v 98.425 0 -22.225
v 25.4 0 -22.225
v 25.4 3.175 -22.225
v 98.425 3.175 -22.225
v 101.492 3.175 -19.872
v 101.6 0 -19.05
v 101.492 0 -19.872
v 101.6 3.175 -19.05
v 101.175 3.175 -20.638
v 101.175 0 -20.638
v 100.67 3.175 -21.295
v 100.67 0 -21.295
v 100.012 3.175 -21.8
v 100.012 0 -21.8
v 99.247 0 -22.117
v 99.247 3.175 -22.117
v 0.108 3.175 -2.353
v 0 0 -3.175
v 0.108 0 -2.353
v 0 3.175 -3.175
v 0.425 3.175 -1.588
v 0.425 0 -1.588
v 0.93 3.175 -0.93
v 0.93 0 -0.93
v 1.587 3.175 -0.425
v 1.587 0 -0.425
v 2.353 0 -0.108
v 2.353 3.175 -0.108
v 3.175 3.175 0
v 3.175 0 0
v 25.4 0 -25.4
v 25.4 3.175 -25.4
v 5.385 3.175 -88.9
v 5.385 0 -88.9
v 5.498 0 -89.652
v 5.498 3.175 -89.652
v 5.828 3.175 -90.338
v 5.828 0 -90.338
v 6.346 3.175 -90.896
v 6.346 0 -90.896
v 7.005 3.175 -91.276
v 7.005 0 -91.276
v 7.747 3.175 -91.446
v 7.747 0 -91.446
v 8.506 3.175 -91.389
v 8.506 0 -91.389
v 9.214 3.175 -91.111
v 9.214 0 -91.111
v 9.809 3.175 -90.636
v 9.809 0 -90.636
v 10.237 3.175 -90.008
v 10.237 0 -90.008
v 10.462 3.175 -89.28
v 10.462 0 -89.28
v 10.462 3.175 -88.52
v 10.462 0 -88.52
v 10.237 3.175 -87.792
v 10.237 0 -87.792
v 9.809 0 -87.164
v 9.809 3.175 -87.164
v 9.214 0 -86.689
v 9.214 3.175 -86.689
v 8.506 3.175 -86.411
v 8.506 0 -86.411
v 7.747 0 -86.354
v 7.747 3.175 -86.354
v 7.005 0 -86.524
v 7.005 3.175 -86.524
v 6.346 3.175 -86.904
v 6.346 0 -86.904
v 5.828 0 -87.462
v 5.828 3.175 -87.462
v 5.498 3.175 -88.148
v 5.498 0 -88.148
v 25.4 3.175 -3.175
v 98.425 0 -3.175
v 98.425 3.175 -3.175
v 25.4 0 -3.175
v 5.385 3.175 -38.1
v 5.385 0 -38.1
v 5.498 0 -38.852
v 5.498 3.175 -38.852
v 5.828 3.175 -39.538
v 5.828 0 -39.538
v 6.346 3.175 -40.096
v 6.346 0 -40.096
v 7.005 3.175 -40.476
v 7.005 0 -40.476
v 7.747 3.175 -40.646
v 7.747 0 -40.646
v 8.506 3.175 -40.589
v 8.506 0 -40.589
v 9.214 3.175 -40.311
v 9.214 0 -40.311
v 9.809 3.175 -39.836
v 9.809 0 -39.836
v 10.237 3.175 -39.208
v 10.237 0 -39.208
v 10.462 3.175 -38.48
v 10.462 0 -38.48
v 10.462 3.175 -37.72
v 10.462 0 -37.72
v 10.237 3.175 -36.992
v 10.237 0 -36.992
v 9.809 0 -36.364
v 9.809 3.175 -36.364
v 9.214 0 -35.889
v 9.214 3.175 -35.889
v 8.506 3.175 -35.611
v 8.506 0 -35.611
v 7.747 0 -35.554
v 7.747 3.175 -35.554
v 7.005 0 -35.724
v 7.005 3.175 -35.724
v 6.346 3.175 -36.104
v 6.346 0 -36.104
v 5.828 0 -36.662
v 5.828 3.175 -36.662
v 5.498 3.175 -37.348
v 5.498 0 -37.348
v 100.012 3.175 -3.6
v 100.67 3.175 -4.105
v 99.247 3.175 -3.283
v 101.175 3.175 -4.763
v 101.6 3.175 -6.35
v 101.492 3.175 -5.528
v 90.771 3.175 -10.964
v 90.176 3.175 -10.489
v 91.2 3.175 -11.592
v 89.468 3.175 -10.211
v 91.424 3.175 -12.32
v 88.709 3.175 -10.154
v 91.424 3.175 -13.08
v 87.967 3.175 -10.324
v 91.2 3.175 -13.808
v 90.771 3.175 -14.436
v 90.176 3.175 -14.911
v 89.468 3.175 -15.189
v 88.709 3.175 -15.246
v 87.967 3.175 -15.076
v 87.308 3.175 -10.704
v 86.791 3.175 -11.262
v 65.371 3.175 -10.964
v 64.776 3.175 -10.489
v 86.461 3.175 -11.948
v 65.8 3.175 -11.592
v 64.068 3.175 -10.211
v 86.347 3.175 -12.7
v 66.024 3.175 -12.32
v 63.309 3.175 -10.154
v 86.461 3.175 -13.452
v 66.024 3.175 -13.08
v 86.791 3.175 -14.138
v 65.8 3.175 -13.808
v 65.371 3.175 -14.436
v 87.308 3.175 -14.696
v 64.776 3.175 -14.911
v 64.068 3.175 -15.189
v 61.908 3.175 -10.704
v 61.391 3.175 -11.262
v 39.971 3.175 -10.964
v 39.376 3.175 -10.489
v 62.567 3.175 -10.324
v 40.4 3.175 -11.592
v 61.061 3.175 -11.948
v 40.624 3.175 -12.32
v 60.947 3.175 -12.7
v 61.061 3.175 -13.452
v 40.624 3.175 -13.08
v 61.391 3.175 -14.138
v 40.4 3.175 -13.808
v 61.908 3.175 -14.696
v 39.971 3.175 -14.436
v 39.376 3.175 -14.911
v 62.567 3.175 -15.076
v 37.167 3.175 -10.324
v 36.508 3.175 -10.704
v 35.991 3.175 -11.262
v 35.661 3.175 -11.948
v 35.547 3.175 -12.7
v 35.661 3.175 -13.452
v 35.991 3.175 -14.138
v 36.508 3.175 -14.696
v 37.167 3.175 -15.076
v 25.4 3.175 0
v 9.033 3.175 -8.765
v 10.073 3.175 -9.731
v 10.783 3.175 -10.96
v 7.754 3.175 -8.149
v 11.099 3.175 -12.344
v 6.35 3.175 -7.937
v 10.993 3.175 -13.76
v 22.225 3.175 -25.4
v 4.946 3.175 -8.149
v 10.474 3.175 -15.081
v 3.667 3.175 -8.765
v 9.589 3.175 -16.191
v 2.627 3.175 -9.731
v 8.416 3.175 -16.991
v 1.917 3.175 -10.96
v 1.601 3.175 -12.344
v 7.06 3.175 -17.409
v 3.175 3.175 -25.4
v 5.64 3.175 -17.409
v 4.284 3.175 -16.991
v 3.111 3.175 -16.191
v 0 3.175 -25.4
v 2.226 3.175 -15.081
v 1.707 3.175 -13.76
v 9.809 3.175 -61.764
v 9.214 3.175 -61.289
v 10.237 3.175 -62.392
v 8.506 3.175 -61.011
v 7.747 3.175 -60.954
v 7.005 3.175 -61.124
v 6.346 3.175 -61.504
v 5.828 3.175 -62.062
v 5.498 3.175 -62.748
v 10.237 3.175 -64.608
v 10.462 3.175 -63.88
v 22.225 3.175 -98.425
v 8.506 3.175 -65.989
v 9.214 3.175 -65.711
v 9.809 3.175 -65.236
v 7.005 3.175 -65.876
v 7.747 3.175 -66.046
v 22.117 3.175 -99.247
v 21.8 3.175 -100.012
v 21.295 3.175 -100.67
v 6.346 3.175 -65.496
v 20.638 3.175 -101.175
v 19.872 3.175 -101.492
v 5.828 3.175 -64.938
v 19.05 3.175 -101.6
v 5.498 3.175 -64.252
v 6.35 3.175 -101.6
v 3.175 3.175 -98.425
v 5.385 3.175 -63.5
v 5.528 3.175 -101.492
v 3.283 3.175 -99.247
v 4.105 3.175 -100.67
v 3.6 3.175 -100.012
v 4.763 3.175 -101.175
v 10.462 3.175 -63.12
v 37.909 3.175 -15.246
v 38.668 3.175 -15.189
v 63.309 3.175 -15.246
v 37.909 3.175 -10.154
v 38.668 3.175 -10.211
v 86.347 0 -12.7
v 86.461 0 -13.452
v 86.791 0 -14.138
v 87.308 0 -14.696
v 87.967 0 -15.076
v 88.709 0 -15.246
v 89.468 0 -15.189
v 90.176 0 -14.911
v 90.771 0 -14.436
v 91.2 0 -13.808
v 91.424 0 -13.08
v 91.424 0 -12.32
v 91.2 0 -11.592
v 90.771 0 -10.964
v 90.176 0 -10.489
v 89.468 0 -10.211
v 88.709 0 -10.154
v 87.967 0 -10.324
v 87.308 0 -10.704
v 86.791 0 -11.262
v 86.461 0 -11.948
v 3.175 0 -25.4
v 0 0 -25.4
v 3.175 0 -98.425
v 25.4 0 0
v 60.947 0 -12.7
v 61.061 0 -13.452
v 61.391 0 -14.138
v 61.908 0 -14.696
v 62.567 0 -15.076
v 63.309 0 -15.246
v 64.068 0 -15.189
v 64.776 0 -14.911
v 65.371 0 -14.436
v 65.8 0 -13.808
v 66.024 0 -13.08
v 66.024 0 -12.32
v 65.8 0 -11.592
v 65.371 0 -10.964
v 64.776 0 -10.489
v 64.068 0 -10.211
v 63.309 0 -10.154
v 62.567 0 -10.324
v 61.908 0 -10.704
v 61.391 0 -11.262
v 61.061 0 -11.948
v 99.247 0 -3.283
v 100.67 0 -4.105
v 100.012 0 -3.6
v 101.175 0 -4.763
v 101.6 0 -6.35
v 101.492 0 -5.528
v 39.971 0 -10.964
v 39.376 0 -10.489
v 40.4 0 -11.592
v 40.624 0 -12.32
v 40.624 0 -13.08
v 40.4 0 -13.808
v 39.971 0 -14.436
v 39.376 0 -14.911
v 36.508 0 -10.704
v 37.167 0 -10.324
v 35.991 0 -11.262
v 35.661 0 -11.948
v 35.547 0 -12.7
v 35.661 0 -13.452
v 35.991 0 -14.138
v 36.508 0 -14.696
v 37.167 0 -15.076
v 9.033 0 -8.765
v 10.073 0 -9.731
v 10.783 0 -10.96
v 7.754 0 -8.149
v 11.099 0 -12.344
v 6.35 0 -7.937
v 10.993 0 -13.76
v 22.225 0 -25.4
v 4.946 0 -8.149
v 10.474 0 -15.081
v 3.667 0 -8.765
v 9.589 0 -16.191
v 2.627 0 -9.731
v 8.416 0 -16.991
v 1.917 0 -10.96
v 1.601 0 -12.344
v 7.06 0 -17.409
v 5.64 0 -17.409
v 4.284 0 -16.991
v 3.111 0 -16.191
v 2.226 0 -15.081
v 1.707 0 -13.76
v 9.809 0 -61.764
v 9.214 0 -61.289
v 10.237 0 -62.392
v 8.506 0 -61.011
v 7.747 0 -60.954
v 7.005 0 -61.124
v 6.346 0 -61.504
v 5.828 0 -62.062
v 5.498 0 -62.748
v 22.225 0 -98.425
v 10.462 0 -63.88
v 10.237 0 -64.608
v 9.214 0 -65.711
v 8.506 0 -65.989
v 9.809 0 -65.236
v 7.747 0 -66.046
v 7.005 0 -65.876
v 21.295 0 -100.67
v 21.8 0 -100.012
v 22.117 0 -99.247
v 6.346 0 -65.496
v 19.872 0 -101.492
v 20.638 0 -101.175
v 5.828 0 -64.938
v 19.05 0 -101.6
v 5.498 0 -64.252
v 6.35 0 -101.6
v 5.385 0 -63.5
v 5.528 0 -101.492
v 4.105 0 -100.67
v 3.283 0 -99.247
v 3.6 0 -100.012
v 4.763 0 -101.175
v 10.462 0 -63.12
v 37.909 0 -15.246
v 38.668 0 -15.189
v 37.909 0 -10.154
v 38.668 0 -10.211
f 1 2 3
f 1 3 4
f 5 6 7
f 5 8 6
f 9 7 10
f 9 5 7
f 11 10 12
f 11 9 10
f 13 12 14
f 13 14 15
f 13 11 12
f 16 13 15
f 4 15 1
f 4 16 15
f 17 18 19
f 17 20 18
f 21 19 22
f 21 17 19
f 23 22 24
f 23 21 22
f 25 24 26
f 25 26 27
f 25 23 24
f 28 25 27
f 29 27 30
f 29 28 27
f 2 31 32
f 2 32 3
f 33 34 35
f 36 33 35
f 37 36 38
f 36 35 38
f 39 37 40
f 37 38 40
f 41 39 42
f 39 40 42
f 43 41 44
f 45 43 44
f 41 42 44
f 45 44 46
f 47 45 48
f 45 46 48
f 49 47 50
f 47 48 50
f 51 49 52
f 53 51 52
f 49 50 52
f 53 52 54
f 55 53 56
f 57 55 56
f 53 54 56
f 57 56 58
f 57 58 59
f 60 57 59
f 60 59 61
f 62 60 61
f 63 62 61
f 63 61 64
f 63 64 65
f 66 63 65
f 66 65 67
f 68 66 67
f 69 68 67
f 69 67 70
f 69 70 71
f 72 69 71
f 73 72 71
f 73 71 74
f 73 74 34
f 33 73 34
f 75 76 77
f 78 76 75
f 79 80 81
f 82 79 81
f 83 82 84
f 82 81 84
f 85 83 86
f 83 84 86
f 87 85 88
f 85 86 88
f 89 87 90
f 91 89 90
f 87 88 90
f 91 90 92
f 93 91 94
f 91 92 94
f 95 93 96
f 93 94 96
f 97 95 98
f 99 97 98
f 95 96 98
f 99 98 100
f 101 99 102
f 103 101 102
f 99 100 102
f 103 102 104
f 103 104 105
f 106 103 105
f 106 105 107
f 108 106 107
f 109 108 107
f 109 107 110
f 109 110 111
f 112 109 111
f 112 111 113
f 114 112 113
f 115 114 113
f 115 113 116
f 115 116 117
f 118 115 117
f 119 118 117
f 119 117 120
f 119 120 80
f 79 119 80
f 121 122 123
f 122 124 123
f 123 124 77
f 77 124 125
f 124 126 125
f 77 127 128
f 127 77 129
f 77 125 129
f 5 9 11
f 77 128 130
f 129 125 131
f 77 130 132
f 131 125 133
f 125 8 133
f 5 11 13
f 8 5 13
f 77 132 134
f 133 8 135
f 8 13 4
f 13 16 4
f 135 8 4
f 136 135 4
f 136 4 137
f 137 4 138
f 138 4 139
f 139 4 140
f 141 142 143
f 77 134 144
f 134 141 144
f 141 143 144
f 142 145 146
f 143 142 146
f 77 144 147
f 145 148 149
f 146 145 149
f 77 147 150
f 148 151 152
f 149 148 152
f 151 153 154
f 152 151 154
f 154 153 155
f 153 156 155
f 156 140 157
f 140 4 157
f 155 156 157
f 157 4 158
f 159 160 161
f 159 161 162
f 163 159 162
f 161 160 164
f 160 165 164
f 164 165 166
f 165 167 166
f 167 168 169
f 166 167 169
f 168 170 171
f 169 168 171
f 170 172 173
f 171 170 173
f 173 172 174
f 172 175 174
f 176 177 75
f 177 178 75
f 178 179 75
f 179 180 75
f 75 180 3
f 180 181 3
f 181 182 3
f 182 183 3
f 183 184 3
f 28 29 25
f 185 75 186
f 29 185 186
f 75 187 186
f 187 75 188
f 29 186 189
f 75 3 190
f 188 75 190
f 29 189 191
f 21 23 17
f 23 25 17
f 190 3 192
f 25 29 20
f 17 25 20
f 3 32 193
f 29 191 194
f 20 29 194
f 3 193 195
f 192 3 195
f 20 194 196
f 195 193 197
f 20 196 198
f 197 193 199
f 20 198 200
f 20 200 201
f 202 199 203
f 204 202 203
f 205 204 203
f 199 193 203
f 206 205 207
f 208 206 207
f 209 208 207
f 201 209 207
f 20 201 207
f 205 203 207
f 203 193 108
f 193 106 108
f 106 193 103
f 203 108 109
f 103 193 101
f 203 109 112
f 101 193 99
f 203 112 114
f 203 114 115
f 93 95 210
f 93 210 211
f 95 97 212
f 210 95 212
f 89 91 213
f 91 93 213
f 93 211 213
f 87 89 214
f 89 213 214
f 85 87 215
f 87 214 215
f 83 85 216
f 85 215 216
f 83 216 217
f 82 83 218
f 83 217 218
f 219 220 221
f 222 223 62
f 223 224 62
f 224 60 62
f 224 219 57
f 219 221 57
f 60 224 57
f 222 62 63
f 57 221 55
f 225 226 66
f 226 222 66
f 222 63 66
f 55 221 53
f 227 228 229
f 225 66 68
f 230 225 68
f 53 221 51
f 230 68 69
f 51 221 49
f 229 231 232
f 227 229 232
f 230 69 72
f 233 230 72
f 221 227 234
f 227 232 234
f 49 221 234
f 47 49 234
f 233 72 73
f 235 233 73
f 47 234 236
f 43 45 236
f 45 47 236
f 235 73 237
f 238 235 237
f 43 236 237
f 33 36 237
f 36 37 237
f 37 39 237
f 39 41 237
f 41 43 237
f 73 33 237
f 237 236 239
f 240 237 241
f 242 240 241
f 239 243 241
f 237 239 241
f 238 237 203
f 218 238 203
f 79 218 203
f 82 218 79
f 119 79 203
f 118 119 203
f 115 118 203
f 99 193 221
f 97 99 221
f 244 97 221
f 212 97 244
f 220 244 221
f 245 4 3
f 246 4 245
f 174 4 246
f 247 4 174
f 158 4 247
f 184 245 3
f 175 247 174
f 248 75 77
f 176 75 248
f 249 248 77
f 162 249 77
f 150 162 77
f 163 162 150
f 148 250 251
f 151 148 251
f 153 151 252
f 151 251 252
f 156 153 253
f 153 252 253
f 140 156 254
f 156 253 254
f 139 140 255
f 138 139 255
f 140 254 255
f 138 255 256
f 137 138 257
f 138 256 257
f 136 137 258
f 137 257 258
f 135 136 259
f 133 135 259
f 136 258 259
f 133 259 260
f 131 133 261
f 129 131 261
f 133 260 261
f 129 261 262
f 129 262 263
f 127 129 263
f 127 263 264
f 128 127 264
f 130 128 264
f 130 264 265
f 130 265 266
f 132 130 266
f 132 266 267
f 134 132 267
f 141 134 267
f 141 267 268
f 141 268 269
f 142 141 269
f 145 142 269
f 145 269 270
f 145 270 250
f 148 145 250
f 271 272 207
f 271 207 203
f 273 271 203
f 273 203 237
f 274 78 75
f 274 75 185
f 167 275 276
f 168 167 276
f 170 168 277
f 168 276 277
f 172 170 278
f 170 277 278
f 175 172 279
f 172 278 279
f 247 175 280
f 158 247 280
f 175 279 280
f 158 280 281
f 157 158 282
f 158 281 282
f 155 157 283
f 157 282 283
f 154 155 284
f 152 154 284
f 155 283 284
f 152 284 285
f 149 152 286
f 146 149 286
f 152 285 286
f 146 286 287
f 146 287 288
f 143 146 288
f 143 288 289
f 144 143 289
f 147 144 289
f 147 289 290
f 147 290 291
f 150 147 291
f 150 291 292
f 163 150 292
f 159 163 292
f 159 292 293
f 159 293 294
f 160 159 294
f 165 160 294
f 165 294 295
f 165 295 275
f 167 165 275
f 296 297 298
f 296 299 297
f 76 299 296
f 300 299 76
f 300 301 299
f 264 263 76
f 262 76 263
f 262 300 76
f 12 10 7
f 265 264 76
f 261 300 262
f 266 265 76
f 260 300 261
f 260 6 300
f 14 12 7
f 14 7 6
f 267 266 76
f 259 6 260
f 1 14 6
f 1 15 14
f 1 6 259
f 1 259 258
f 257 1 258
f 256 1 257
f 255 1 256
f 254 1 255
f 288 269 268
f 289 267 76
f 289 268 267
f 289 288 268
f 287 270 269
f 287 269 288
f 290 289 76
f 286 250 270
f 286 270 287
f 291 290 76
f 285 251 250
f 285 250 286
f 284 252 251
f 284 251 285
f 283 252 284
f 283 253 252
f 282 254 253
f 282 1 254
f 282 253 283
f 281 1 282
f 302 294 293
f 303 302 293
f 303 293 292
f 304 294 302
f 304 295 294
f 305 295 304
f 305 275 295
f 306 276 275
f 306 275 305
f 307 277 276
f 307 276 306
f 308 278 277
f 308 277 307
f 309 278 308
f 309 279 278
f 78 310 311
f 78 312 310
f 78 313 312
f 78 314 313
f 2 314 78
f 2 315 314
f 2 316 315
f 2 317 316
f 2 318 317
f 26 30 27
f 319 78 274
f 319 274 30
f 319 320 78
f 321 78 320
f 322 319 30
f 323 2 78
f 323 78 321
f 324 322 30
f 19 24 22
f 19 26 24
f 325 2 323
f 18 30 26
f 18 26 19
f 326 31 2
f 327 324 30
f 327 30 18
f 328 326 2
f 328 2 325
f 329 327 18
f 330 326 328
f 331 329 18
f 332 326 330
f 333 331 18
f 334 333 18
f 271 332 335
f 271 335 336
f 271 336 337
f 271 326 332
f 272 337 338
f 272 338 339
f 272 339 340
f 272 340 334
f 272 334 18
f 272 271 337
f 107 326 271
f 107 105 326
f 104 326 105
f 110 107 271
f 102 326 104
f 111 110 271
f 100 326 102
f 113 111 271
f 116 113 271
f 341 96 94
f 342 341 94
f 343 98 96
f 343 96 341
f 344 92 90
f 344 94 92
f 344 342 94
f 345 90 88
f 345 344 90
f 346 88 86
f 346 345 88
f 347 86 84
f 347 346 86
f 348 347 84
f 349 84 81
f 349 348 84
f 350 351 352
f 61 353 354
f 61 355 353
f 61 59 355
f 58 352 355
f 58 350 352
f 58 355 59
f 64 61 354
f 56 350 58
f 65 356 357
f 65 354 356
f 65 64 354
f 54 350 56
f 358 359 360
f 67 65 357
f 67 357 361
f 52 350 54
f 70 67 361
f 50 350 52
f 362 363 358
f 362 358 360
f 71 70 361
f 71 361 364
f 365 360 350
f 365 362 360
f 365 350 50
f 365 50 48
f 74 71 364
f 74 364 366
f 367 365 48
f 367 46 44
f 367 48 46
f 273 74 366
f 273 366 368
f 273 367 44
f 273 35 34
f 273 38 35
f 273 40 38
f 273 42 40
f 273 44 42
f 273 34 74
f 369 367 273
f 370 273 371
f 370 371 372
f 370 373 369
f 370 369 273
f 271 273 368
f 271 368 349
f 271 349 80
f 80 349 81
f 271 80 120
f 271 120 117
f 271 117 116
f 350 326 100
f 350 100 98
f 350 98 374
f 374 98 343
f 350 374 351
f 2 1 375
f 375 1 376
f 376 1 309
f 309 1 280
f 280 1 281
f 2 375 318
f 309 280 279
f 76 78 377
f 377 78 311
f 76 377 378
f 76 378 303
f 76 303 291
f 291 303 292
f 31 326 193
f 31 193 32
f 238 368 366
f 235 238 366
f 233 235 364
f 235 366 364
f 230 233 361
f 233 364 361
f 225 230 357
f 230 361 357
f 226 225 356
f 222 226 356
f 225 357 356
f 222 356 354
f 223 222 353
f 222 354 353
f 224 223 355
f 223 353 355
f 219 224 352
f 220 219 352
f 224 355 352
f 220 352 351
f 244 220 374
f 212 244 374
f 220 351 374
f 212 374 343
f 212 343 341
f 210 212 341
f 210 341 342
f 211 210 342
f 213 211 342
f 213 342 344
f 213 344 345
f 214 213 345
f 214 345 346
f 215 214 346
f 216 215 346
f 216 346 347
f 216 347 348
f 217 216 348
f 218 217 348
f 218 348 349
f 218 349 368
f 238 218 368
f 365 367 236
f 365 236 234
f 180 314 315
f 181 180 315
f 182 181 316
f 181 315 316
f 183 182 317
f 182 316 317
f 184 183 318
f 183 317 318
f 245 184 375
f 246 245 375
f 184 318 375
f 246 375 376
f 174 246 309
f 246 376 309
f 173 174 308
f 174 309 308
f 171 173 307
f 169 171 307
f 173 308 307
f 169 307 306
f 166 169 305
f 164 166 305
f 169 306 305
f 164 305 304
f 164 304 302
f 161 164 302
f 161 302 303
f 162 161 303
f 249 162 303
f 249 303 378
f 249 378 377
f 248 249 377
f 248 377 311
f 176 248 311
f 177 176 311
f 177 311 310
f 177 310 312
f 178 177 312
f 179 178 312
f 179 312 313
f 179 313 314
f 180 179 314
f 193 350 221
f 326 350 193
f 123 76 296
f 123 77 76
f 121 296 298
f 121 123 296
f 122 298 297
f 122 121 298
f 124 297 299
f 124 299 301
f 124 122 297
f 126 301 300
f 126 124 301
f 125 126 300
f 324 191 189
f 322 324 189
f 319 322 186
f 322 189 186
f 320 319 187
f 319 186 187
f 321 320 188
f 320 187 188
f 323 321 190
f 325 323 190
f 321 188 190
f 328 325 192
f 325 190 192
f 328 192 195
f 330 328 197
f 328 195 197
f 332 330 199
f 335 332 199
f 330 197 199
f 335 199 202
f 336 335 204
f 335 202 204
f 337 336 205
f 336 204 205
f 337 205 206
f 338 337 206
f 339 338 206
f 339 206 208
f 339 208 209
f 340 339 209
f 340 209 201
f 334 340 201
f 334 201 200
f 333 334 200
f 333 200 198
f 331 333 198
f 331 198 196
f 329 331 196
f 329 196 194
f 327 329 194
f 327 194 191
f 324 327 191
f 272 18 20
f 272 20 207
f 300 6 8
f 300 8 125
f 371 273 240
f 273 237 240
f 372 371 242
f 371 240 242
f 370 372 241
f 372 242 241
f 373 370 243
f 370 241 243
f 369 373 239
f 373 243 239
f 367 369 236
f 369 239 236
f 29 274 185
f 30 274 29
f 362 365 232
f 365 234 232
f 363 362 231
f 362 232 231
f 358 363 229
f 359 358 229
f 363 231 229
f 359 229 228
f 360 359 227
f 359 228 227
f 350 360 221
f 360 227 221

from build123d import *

# Parameters (mm, degrees)
BOSS_EXTRUDE1_DEPTH    = 3.175
F_10_CLEARANCE_HOLE1_D = 5.1054
SKETCH5_R              = 4.7625
CUT_EXTRUDE1_DEPTH     = 144.719172782
FILLET1_R              = 3.175


with BuildPart() as part:
    # Sketch2 → Boss-Extrude1 (new body)
    with BuildSketch(Plane(origin=(0, 0, 0), x_dir=(1, 0, 0), z_dir=(0, 1, 0))):
        Polygon((0, 0), (0, 25.4), (3.175, 25.4), (3.175, 101.6), (22.225, 101.6), (22.225, 25.4), (25.4, 25.4), (25.4, 22.225), (101.6, 22.225), (101.6, 3.175), (25.4, 3.175), (25.4, 0), align=None)
    extrude(amount=BOSS_EXTRUDE1_DEPTH)

    # #10 Clearance Hole1 (through all)
    with Locations(Plane(origin=(0, 3.175, 0), x_dir=(1, 0, 0), z_dir=(0, 1, 0))):
        with Locations((88.9, 12.7), (7.9375, 88.9), (7.9375, 63.5), (7.9375, 38.1), (38.1, 12.7), (63.5, 12.7)):
            Hole(F_10_CLEARANCE_HOLE1_D / 2)

    # Sketch5 → Cut-Extrude1 (cut, through all)
    with BuildSketch(Plane(origin=(0, 3.175, 0), x_dir=(1, 0, 0), z_dir=(0, 1, 0))):
        with Locations(Location((6.35, 12.7, 0), (0, 0, 270))):
            Circle(SKETCH5_R)
    extrude(amount=-CUT_EXTRUDE1_DEPTH, mode=Mode.SUBTRACT)

    # Fillet1
    fillet1_edges = [part.edges().sort_by_distance(p)[0] for p in [
        (0, 1.5875, 0),
        (3.175, 1.5875, -101.6),
        (22.225, 1.5875, -101.6),
        (101.6, 1.5875, -22.225),
        (101.6, 1.5875, -3.175),
    ]]
    fillet(fillet1_edges, radius=FILLET1_R)


solid = part.part
